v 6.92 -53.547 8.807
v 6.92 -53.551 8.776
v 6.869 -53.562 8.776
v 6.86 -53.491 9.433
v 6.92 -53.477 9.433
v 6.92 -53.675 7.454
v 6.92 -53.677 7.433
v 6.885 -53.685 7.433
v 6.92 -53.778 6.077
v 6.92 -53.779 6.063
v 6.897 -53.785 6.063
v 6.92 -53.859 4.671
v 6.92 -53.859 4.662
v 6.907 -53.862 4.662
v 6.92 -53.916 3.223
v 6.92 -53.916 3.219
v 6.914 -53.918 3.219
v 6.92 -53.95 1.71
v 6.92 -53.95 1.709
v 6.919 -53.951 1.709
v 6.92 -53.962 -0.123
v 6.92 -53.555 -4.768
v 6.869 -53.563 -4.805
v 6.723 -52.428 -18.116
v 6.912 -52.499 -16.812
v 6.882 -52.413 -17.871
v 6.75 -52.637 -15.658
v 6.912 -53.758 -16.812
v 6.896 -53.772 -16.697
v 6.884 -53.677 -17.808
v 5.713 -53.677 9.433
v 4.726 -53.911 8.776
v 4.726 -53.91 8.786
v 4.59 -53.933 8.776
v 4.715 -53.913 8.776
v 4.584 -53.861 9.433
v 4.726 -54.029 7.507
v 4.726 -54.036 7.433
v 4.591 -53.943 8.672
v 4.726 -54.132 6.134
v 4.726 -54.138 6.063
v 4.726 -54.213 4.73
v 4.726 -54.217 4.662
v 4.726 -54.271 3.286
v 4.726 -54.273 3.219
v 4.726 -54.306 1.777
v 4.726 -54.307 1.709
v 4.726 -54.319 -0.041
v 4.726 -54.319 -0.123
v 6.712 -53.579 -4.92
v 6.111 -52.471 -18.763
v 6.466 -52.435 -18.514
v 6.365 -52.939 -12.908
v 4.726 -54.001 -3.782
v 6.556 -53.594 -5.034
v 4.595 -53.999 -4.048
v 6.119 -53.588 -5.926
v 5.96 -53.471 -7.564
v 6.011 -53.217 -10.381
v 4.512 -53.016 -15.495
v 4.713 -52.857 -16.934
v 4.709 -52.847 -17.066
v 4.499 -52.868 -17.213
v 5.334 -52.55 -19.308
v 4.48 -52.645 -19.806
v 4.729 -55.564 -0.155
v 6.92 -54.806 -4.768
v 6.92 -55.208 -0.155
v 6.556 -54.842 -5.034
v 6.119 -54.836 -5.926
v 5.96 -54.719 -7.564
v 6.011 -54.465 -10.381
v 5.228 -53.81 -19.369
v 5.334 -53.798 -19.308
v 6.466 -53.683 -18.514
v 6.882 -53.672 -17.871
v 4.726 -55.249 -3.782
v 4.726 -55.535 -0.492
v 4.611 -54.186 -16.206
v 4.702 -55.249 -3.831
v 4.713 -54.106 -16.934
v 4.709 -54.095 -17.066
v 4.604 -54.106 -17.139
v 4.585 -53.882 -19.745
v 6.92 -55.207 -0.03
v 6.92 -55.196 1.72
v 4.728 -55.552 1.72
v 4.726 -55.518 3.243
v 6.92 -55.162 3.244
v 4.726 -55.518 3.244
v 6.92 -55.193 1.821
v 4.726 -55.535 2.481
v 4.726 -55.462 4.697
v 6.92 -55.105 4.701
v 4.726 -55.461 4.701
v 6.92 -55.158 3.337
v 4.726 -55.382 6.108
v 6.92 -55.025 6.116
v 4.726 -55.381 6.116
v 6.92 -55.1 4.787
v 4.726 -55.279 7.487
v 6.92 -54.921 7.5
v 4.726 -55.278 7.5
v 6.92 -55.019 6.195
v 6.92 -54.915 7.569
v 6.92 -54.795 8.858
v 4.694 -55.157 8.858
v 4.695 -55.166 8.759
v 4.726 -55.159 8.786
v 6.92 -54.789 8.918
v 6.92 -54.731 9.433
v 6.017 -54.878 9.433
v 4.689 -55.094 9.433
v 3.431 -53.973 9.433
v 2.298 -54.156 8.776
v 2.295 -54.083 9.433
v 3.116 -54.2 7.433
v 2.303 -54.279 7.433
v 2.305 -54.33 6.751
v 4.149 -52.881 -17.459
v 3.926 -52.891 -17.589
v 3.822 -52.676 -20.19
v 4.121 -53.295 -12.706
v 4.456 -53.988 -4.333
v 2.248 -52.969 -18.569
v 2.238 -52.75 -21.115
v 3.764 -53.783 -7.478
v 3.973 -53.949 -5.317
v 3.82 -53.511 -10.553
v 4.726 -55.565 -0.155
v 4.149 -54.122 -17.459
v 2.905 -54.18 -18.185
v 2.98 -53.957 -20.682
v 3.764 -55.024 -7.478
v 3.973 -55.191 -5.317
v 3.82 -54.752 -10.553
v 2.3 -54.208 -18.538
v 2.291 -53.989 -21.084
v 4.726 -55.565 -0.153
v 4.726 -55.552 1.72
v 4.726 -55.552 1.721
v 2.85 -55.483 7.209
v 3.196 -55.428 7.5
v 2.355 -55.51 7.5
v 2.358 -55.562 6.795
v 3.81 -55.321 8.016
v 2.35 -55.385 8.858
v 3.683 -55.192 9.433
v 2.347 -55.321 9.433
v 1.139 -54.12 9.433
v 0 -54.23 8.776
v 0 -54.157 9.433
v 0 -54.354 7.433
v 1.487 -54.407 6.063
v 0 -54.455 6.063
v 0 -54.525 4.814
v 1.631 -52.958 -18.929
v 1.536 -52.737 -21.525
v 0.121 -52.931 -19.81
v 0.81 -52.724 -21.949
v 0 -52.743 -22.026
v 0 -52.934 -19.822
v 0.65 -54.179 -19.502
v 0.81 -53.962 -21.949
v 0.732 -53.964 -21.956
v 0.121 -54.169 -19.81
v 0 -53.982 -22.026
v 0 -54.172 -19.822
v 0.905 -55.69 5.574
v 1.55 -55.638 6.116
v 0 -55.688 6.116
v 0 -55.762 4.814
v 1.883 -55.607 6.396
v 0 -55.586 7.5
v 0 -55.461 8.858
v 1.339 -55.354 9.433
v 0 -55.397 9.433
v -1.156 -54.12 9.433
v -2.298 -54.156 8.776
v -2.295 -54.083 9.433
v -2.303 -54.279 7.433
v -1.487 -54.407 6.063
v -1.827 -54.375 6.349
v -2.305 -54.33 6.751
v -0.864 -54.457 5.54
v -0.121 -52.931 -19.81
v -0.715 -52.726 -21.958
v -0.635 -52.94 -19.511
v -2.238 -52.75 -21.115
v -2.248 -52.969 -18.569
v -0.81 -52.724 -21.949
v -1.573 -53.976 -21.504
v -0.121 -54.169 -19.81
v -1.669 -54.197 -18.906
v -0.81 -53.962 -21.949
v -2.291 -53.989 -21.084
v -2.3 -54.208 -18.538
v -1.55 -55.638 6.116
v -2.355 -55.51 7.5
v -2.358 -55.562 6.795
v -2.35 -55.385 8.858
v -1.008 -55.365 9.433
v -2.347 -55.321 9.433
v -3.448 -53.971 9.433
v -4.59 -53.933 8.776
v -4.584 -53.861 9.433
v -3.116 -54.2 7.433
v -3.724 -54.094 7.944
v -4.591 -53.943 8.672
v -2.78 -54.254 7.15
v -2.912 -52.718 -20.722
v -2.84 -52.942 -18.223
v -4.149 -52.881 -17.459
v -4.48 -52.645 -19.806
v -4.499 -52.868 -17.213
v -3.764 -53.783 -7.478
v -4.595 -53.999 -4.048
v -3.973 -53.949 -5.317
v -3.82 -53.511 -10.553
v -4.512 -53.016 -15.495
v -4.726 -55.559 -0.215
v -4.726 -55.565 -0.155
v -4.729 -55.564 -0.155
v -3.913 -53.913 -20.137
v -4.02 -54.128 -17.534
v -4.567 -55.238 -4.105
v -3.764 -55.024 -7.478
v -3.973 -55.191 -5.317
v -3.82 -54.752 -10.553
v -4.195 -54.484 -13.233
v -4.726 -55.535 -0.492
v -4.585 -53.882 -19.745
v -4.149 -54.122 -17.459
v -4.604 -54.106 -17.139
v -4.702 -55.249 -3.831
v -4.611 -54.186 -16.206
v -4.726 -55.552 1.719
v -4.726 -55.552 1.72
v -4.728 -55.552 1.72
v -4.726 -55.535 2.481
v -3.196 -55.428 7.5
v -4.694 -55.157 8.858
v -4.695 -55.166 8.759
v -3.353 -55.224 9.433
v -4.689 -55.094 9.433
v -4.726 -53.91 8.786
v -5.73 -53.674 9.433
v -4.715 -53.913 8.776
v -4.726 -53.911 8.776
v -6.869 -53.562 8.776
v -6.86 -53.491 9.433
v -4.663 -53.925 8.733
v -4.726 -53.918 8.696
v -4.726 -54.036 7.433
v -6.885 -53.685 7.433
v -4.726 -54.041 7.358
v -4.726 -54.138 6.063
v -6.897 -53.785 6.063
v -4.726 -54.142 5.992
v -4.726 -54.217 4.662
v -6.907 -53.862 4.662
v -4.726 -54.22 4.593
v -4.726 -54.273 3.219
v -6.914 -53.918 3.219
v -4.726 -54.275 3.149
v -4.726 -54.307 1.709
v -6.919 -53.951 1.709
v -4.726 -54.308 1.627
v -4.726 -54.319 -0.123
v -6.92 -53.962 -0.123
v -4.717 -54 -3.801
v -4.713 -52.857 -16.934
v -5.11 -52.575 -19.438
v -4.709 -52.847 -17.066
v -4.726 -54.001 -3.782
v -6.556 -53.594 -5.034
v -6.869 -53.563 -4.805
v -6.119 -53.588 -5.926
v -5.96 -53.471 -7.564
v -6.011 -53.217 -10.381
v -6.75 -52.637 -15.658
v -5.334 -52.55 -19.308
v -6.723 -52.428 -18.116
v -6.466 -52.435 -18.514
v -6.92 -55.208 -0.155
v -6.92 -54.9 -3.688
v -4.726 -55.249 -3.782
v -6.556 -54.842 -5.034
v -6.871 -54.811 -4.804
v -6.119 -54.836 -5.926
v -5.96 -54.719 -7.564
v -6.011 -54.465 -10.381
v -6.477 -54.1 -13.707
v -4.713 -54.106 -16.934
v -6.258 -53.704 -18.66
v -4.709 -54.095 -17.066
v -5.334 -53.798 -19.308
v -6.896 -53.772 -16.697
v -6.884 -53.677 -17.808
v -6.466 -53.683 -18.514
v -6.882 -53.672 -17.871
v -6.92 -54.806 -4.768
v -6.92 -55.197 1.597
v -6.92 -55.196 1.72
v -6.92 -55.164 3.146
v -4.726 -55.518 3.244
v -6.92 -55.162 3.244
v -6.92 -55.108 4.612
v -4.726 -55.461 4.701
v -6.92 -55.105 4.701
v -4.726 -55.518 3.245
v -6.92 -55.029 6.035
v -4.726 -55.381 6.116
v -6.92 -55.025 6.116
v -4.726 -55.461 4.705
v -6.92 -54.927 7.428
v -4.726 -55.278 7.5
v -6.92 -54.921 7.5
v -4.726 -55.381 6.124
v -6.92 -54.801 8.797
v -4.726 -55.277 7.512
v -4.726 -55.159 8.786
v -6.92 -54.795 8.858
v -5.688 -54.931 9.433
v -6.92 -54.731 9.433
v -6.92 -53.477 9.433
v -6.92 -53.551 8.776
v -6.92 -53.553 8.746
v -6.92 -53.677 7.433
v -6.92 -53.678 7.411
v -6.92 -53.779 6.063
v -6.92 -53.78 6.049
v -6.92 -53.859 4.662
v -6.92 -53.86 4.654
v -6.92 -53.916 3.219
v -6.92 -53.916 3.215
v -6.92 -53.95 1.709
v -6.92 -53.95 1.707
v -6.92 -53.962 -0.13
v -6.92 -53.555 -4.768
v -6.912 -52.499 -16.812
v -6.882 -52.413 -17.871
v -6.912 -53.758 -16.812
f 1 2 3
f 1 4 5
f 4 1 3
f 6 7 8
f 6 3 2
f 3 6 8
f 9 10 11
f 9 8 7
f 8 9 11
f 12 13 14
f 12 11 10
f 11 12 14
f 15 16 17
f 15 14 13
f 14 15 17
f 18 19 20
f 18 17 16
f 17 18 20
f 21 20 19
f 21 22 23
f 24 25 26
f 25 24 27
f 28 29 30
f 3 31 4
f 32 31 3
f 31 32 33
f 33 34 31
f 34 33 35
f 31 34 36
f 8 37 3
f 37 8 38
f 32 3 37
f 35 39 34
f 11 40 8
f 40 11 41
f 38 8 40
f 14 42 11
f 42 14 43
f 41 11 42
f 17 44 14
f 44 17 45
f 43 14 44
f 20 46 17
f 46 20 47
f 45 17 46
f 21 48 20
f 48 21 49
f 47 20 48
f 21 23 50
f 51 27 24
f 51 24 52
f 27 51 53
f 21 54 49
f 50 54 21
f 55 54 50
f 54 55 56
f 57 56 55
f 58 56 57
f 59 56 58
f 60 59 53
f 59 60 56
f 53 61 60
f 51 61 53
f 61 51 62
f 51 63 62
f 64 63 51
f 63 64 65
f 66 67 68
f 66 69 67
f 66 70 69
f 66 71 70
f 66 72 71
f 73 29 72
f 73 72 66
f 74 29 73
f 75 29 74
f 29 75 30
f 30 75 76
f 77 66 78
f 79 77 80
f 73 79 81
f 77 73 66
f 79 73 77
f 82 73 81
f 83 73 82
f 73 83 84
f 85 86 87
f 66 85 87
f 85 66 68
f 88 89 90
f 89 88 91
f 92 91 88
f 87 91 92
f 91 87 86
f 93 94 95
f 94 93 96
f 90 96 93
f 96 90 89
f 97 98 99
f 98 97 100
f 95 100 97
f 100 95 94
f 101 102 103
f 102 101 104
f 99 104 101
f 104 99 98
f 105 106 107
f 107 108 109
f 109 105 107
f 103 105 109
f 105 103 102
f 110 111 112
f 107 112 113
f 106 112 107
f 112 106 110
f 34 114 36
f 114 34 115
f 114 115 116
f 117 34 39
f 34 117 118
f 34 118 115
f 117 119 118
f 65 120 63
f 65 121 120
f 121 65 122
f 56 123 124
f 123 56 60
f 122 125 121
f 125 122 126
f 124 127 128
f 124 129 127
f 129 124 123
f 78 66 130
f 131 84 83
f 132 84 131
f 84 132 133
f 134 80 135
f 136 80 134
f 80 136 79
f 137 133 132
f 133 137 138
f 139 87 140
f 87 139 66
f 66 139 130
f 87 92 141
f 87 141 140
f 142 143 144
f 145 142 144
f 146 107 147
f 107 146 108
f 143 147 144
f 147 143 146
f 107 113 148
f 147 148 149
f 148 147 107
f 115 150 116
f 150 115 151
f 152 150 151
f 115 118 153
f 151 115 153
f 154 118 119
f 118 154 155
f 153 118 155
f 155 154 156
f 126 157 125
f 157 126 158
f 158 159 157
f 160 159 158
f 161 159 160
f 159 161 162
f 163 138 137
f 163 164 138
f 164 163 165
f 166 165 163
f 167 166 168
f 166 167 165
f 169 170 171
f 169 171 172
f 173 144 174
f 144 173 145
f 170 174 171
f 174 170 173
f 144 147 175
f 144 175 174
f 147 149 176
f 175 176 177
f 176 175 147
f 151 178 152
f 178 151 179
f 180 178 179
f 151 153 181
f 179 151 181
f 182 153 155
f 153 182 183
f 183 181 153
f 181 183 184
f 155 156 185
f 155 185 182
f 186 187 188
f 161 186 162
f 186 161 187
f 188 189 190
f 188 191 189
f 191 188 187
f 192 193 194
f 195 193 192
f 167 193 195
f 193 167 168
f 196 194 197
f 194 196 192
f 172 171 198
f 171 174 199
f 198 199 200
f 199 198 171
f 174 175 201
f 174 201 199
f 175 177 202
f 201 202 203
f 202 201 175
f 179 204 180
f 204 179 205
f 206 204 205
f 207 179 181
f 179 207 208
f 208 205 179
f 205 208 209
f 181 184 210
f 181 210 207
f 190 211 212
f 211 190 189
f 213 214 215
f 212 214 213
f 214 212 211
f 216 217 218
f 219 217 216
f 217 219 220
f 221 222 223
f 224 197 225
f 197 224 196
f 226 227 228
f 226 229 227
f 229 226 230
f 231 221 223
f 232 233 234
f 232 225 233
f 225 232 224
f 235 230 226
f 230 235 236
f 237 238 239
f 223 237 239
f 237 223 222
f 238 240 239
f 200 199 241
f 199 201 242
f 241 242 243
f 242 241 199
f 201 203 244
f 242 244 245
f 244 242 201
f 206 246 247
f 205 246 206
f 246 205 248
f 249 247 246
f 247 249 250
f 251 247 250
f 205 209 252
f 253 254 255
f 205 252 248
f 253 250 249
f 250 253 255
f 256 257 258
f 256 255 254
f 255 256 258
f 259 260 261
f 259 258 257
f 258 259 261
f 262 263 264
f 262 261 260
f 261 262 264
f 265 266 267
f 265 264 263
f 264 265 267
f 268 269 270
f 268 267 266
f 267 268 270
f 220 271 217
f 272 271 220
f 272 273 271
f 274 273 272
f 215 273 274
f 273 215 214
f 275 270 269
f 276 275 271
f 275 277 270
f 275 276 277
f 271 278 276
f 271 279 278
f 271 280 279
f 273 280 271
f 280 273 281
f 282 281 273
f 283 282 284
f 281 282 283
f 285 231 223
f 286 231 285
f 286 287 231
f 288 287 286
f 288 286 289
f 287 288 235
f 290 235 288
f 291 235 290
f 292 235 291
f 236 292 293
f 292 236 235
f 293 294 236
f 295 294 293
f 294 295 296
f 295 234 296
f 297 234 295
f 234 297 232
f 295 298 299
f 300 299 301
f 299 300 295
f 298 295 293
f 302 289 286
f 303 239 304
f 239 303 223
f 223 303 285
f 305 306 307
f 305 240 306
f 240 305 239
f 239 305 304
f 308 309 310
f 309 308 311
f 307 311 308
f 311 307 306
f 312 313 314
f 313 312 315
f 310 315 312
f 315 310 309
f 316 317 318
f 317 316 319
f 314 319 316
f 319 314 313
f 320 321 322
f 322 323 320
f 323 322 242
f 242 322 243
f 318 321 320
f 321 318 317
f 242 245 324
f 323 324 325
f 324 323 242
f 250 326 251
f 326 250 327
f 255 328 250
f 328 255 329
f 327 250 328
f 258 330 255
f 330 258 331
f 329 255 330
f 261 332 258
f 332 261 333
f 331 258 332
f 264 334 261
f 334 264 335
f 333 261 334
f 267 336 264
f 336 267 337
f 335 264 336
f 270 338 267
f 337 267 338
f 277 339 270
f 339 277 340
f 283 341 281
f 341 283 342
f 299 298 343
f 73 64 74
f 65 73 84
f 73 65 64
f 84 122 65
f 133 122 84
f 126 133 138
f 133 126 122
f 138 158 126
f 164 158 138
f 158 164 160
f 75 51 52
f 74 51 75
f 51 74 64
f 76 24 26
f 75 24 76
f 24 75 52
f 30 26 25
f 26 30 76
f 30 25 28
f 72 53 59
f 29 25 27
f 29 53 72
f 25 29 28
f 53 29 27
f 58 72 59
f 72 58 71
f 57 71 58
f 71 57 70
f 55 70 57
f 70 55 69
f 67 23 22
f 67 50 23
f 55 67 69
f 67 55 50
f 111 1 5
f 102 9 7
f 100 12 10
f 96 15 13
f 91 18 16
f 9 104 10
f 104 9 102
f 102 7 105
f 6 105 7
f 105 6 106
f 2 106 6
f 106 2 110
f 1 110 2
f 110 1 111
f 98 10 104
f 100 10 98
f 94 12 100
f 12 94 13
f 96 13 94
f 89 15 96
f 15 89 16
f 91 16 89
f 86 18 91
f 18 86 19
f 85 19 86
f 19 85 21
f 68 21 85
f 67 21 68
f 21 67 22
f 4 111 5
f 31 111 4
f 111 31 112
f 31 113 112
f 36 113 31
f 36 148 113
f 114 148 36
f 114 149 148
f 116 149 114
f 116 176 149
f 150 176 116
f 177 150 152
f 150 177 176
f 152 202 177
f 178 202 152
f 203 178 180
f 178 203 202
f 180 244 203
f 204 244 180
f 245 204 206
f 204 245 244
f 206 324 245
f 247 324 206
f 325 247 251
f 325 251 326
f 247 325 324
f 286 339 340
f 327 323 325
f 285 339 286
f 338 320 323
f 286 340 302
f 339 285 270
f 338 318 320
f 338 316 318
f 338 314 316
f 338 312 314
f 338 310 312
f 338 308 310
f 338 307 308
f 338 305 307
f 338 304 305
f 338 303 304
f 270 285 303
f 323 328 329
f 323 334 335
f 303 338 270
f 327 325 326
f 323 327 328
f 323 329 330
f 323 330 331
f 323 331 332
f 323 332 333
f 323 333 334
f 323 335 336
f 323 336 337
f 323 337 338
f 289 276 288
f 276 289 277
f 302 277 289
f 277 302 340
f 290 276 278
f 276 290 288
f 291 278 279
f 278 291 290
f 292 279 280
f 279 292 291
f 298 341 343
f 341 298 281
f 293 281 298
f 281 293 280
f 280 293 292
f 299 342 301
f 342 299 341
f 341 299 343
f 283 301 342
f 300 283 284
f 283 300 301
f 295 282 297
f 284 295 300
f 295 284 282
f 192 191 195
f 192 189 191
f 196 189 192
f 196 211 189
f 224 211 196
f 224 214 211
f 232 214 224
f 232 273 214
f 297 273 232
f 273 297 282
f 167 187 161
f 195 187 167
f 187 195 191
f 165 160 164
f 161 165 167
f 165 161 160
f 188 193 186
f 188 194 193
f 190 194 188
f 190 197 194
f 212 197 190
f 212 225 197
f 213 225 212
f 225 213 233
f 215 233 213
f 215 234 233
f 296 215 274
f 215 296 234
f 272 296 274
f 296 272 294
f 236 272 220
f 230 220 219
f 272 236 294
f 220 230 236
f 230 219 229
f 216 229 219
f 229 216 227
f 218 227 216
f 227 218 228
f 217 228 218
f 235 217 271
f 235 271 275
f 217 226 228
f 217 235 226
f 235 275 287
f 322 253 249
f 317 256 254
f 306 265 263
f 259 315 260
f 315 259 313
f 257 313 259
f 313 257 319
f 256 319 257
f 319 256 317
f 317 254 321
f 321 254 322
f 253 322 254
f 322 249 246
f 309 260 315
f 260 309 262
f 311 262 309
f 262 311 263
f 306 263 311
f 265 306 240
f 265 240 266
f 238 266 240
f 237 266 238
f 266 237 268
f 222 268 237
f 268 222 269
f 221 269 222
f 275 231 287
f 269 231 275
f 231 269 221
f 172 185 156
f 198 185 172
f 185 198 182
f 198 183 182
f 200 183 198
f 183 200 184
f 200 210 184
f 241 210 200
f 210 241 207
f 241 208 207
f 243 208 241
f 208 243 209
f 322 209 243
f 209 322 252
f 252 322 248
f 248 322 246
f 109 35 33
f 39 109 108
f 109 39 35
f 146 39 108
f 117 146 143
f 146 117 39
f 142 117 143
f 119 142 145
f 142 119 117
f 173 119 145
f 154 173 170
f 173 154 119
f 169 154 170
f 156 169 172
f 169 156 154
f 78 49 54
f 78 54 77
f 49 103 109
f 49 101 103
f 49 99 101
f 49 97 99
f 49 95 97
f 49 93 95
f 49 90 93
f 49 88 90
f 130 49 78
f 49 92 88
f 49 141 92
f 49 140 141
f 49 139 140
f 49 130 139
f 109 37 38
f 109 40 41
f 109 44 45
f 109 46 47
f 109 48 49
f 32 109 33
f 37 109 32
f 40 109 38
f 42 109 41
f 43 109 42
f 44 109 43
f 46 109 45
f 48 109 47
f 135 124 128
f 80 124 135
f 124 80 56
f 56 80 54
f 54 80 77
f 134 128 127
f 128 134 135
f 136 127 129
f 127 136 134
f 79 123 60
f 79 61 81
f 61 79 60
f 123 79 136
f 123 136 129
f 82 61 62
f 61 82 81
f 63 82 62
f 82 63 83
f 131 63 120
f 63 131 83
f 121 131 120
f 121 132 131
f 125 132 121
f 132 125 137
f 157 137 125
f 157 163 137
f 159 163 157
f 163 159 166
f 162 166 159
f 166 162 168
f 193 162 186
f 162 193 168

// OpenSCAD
include <winged_helmet_v21.scad>
part = "none";
intersection() { bl_slab(2); face_prism() strap_gold2d(); }
